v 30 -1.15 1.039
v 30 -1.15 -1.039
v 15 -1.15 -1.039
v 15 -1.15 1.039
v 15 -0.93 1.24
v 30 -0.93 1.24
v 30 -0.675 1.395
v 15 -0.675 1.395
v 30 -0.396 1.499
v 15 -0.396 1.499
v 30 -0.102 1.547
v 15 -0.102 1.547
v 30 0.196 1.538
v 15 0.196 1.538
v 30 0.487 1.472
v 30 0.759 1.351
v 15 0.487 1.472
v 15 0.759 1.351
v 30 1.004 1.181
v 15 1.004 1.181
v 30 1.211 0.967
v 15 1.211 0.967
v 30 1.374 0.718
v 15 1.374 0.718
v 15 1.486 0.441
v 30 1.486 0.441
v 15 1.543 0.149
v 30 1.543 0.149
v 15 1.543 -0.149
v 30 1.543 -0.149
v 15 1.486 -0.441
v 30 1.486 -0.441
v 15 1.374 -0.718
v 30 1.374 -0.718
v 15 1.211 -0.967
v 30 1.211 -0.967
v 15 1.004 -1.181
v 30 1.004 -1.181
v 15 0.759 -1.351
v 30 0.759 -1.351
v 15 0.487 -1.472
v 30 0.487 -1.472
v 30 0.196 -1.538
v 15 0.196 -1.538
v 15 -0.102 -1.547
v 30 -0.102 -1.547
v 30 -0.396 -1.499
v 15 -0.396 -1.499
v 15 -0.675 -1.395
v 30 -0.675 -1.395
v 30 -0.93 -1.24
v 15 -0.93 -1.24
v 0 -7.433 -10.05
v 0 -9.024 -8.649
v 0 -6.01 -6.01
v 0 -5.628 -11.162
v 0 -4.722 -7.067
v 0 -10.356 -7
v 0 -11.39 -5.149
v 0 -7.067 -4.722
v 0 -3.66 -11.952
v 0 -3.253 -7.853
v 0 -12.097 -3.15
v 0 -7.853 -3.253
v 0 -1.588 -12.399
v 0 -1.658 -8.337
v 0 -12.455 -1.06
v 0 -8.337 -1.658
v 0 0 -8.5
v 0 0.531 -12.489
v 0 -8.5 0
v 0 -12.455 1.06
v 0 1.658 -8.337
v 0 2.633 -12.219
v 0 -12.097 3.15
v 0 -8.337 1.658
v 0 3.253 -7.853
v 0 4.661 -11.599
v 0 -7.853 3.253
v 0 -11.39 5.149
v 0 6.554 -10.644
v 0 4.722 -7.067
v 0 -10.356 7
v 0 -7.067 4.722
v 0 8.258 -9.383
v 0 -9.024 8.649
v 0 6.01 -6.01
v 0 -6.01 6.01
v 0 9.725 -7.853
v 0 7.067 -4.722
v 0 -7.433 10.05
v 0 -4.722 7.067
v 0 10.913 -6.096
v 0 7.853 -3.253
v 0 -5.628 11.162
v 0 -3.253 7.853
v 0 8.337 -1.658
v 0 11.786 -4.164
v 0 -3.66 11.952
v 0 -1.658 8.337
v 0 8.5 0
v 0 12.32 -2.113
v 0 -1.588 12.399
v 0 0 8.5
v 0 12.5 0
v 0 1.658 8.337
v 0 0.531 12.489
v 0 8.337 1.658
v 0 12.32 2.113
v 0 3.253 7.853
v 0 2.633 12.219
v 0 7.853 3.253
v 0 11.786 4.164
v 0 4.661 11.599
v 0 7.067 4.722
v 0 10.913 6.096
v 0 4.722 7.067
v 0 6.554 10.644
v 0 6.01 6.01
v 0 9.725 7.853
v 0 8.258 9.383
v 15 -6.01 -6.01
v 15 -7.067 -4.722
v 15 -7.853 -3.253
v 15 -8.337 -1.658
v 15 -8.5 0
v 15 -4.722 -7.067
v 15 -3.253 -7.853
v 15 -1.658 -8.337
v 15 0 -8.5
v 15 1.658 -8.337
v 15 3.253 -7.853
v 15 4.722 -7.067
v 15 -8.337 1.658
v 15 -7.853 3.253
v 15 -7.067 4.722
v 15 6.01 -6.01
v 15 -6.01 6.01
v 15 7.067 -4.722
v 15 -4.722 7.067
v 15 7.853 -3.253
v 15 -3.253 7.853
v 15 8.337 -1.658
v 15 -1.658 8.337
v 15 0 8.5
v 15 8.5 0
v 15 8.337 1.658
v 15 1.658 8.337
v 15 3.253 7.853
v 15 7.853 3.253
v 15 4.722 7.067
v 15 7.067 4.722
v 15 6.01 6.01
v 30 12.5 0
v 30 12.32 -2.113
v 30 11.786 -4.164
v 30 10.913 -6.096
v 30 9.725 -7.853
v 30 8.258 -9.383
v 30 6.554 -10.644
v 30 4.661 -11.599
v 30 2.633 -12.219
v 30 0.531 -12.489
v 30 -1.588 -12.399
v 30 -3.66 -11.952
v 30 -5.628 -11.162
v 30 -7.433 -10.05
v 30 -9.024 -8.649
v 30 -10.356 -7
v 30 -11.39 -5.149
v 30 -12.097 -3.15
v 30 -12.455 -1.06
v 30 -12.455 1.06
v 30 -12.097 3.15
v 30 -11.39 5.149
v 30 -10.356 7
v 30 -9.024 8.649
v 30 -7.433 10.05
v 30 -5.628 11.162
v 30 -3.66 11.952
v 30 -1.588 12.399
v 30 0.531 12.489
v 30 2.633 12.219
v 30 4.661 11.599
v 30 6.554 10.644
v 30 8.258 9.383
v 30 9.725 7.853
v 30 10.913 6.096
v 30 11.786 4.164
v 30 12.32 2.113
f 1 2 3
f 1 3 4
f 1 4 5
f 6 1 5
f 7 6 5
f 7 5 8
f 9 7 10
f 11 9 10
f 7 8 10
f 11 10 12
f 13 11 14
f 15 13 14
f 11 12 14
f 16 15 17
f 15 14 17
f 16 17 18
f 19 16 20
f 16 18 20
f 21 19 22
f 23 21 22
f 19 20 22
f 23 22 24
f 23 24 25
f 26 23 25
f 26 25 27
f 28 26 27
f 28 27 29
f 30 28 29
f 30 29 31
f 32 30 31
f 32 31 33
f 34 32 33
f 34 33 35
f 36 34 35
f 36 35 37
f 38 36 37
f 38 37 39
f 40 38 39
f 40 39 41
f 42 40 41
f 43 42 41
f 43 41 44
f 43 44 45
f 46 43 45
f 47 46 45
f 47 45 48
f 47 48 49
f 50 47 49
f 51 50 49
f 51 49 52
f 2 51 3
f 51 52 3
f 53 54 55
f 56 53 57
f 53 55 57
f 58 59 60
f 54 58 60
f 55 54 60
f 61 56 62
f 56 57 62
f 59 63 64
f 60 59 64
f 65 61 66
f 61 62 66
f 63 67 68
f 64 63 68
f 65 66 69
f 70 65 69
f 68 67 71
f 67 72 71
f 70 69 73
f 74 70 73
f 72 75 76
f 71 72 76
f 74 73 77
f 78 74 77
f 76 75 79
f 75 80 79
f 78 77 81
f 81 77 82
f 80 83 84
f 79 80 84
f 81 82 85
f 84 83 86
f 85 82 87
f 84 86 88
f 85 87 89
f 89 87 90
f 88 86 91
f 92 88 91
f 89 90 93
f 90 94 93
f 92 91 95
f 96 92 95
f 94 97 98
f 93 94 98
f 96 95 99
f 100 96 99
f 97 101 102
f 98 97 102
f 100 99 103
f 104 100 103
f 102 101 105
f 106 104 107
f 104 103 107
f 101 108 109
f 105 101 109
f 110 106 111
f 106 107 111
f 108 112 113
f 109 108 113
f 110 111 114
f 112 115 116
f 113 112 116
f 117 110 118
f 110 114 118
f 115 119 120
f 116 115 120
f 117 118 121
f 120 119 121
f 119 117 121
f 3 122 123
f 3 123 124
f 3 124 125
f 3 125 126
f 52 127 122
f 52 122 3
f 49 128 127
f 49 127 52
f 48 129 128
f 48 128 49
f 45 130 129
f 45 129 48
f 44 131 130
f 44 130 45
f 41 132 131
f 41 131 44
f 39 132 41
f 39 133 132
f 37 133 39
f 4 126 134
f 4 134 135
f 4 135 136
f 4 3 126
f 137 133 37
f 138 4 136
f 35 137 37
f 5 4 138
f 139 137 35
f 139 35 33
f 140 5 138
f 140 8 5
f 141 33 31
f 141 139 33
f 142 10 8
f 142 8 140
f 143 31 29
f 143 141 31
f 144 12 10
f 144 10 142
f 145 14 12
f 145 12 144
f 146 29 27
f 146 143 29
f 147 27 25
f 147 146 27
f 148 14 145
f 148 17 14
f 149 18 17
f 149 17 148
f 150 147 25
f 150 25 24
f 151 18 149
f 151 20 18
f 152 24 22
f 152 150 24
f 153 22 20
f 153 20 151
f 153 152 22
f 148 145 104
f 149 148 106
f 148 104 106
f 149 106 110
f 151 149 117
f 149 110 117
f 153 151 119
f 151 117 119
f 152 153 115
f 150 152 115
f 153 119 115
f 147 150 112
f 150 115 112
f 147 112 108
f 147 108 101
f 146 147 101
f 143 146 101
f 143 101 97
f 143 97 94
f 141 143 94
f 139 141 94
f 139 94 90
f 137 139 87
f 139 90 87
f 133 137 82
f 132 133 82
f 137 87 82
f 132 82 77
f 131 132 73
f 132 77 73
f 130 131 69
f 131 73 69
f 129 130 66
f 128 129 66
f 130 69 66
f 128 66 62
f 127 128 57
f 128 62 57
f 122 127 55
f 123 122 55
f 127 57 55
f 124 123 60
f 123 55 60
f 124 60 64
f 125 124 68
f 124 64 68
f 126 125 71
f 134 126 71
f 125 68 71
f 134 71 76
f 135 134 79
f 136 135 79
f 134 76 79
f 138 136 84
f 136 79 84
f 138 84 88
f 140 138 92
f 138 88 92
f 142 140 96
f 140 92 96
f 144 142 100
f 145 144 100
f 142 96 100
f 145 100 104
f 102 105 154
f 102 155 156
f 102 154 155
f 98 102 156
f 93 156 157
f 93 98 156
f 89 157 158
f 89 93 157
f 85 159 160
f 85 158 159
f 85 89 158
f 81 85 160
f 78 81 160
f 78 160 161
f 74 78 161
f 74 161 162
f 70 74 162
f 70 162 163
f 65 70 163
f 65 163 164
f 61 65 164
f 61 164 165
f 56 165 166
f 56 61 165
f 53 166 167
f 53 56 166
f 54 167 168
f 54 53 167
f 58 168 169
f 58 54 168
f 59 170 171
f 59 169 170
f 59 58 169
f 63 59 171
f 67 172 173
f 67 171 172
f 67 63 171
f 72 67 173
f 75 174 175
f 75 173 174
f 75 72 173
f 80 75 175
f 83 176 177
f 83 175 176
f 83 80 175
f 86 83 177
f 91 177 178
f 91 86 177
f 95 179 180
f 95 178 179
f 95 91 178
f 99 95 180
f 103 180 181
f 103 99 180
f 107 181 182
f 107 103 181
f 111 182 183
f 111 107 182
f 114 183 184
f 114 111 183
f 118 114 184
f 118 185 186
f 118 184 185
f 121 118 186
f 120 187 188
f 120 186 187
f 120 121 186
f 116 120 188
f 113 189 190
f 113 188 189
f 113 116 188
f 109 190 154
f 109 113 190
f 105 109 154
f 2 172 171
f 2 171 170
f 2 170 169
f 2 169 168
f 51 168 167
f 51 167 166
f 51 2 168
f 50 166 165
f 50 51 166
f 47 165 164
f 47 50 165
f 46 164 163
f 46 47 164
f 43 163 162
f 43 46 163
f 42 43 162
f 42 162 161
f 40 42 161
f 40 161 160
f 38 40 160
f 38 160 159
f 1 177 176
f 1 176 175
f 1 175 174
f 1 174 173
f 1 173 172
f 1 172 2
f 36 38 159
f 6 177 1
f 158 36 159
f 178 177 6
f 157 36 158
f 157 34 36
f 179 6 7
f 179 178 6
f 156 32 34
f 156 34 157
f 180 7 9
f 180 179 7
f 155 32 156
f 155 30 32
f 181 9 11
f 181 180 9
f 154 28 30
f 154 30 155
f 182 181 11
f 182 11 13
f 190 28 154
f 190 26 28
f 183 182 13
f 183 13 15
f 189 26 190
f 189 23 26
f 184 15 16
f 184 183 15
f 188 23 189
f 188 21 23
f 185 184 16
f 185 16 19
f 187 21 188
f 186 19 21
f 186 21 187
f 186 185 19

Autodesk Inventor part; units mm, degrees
ref_plane "YZ Plane" through (0, 0, 0) normal (1, 0, 0) x (0, 1, 0)
ref_plane "XZ Plane" through (0, 0, 0) normal (0, 1, 0) x (-1, 0, 0)
ref_plane "XY Plane" through (0, 0, 0) normal (0, 0, 1) x (1, 0, 0)
sketch "Szkic1" plane through (0, 0, 0) normal (1, 0, 0) x (0, 1, 0)
  circle A0 centre (0, 0) radius 12.5
  dimension "d0" = 25
extrude "Wyciągnięcie proste1" add sketch "Szkic1" along normal blind 30
sketch "Szkic2" plane through (0, 0, 0) normal (-1, 0, 0) x (0, 0, 1)
  circle A0 centre (0, 0) radius 1.55
  dimension "d3" = 3.1
extrude "Wyciągnięcie proste2" cut sketch "Szkic2" against normal blind 30
sketch "Szkic4" plane through (0, 0, 0) normal (-1, 0, 0) x (0, 0, 1)
  circle A0 centre (0, 0) radius 12.5 projected
  circle A1 centre (0, 0) radius 8.5
  dimension "d6" = 4
extrude "Wyciągnięcie proste3" cut sketch "Szkic4" against normal blind 15 contours A1
sketch "Szkic5" plane through (15, 0, 0) normal (-1, 0, 0) x (0, 0, 1)
  circle A0 centre (0, 0) radius 1.55 projected
  circle A1 centre (0, 0) radius 1.55 projected
  line L0 (-1.0392, -1.15) -> (1.0392, -1.15)
  point P0 (0, -1.15)
  point P1 (1.0392, -1.15)
  point P2 (-1.0392, -1.15)
  dimension "d9" = 1.15
extrude "Wyciągnięcie proste4" add sketch "Szkic5" against normal up to surface (15 mm away) contours L0 A0 picked at (-0.2431, -1.2226)
properties part number "kolo"
